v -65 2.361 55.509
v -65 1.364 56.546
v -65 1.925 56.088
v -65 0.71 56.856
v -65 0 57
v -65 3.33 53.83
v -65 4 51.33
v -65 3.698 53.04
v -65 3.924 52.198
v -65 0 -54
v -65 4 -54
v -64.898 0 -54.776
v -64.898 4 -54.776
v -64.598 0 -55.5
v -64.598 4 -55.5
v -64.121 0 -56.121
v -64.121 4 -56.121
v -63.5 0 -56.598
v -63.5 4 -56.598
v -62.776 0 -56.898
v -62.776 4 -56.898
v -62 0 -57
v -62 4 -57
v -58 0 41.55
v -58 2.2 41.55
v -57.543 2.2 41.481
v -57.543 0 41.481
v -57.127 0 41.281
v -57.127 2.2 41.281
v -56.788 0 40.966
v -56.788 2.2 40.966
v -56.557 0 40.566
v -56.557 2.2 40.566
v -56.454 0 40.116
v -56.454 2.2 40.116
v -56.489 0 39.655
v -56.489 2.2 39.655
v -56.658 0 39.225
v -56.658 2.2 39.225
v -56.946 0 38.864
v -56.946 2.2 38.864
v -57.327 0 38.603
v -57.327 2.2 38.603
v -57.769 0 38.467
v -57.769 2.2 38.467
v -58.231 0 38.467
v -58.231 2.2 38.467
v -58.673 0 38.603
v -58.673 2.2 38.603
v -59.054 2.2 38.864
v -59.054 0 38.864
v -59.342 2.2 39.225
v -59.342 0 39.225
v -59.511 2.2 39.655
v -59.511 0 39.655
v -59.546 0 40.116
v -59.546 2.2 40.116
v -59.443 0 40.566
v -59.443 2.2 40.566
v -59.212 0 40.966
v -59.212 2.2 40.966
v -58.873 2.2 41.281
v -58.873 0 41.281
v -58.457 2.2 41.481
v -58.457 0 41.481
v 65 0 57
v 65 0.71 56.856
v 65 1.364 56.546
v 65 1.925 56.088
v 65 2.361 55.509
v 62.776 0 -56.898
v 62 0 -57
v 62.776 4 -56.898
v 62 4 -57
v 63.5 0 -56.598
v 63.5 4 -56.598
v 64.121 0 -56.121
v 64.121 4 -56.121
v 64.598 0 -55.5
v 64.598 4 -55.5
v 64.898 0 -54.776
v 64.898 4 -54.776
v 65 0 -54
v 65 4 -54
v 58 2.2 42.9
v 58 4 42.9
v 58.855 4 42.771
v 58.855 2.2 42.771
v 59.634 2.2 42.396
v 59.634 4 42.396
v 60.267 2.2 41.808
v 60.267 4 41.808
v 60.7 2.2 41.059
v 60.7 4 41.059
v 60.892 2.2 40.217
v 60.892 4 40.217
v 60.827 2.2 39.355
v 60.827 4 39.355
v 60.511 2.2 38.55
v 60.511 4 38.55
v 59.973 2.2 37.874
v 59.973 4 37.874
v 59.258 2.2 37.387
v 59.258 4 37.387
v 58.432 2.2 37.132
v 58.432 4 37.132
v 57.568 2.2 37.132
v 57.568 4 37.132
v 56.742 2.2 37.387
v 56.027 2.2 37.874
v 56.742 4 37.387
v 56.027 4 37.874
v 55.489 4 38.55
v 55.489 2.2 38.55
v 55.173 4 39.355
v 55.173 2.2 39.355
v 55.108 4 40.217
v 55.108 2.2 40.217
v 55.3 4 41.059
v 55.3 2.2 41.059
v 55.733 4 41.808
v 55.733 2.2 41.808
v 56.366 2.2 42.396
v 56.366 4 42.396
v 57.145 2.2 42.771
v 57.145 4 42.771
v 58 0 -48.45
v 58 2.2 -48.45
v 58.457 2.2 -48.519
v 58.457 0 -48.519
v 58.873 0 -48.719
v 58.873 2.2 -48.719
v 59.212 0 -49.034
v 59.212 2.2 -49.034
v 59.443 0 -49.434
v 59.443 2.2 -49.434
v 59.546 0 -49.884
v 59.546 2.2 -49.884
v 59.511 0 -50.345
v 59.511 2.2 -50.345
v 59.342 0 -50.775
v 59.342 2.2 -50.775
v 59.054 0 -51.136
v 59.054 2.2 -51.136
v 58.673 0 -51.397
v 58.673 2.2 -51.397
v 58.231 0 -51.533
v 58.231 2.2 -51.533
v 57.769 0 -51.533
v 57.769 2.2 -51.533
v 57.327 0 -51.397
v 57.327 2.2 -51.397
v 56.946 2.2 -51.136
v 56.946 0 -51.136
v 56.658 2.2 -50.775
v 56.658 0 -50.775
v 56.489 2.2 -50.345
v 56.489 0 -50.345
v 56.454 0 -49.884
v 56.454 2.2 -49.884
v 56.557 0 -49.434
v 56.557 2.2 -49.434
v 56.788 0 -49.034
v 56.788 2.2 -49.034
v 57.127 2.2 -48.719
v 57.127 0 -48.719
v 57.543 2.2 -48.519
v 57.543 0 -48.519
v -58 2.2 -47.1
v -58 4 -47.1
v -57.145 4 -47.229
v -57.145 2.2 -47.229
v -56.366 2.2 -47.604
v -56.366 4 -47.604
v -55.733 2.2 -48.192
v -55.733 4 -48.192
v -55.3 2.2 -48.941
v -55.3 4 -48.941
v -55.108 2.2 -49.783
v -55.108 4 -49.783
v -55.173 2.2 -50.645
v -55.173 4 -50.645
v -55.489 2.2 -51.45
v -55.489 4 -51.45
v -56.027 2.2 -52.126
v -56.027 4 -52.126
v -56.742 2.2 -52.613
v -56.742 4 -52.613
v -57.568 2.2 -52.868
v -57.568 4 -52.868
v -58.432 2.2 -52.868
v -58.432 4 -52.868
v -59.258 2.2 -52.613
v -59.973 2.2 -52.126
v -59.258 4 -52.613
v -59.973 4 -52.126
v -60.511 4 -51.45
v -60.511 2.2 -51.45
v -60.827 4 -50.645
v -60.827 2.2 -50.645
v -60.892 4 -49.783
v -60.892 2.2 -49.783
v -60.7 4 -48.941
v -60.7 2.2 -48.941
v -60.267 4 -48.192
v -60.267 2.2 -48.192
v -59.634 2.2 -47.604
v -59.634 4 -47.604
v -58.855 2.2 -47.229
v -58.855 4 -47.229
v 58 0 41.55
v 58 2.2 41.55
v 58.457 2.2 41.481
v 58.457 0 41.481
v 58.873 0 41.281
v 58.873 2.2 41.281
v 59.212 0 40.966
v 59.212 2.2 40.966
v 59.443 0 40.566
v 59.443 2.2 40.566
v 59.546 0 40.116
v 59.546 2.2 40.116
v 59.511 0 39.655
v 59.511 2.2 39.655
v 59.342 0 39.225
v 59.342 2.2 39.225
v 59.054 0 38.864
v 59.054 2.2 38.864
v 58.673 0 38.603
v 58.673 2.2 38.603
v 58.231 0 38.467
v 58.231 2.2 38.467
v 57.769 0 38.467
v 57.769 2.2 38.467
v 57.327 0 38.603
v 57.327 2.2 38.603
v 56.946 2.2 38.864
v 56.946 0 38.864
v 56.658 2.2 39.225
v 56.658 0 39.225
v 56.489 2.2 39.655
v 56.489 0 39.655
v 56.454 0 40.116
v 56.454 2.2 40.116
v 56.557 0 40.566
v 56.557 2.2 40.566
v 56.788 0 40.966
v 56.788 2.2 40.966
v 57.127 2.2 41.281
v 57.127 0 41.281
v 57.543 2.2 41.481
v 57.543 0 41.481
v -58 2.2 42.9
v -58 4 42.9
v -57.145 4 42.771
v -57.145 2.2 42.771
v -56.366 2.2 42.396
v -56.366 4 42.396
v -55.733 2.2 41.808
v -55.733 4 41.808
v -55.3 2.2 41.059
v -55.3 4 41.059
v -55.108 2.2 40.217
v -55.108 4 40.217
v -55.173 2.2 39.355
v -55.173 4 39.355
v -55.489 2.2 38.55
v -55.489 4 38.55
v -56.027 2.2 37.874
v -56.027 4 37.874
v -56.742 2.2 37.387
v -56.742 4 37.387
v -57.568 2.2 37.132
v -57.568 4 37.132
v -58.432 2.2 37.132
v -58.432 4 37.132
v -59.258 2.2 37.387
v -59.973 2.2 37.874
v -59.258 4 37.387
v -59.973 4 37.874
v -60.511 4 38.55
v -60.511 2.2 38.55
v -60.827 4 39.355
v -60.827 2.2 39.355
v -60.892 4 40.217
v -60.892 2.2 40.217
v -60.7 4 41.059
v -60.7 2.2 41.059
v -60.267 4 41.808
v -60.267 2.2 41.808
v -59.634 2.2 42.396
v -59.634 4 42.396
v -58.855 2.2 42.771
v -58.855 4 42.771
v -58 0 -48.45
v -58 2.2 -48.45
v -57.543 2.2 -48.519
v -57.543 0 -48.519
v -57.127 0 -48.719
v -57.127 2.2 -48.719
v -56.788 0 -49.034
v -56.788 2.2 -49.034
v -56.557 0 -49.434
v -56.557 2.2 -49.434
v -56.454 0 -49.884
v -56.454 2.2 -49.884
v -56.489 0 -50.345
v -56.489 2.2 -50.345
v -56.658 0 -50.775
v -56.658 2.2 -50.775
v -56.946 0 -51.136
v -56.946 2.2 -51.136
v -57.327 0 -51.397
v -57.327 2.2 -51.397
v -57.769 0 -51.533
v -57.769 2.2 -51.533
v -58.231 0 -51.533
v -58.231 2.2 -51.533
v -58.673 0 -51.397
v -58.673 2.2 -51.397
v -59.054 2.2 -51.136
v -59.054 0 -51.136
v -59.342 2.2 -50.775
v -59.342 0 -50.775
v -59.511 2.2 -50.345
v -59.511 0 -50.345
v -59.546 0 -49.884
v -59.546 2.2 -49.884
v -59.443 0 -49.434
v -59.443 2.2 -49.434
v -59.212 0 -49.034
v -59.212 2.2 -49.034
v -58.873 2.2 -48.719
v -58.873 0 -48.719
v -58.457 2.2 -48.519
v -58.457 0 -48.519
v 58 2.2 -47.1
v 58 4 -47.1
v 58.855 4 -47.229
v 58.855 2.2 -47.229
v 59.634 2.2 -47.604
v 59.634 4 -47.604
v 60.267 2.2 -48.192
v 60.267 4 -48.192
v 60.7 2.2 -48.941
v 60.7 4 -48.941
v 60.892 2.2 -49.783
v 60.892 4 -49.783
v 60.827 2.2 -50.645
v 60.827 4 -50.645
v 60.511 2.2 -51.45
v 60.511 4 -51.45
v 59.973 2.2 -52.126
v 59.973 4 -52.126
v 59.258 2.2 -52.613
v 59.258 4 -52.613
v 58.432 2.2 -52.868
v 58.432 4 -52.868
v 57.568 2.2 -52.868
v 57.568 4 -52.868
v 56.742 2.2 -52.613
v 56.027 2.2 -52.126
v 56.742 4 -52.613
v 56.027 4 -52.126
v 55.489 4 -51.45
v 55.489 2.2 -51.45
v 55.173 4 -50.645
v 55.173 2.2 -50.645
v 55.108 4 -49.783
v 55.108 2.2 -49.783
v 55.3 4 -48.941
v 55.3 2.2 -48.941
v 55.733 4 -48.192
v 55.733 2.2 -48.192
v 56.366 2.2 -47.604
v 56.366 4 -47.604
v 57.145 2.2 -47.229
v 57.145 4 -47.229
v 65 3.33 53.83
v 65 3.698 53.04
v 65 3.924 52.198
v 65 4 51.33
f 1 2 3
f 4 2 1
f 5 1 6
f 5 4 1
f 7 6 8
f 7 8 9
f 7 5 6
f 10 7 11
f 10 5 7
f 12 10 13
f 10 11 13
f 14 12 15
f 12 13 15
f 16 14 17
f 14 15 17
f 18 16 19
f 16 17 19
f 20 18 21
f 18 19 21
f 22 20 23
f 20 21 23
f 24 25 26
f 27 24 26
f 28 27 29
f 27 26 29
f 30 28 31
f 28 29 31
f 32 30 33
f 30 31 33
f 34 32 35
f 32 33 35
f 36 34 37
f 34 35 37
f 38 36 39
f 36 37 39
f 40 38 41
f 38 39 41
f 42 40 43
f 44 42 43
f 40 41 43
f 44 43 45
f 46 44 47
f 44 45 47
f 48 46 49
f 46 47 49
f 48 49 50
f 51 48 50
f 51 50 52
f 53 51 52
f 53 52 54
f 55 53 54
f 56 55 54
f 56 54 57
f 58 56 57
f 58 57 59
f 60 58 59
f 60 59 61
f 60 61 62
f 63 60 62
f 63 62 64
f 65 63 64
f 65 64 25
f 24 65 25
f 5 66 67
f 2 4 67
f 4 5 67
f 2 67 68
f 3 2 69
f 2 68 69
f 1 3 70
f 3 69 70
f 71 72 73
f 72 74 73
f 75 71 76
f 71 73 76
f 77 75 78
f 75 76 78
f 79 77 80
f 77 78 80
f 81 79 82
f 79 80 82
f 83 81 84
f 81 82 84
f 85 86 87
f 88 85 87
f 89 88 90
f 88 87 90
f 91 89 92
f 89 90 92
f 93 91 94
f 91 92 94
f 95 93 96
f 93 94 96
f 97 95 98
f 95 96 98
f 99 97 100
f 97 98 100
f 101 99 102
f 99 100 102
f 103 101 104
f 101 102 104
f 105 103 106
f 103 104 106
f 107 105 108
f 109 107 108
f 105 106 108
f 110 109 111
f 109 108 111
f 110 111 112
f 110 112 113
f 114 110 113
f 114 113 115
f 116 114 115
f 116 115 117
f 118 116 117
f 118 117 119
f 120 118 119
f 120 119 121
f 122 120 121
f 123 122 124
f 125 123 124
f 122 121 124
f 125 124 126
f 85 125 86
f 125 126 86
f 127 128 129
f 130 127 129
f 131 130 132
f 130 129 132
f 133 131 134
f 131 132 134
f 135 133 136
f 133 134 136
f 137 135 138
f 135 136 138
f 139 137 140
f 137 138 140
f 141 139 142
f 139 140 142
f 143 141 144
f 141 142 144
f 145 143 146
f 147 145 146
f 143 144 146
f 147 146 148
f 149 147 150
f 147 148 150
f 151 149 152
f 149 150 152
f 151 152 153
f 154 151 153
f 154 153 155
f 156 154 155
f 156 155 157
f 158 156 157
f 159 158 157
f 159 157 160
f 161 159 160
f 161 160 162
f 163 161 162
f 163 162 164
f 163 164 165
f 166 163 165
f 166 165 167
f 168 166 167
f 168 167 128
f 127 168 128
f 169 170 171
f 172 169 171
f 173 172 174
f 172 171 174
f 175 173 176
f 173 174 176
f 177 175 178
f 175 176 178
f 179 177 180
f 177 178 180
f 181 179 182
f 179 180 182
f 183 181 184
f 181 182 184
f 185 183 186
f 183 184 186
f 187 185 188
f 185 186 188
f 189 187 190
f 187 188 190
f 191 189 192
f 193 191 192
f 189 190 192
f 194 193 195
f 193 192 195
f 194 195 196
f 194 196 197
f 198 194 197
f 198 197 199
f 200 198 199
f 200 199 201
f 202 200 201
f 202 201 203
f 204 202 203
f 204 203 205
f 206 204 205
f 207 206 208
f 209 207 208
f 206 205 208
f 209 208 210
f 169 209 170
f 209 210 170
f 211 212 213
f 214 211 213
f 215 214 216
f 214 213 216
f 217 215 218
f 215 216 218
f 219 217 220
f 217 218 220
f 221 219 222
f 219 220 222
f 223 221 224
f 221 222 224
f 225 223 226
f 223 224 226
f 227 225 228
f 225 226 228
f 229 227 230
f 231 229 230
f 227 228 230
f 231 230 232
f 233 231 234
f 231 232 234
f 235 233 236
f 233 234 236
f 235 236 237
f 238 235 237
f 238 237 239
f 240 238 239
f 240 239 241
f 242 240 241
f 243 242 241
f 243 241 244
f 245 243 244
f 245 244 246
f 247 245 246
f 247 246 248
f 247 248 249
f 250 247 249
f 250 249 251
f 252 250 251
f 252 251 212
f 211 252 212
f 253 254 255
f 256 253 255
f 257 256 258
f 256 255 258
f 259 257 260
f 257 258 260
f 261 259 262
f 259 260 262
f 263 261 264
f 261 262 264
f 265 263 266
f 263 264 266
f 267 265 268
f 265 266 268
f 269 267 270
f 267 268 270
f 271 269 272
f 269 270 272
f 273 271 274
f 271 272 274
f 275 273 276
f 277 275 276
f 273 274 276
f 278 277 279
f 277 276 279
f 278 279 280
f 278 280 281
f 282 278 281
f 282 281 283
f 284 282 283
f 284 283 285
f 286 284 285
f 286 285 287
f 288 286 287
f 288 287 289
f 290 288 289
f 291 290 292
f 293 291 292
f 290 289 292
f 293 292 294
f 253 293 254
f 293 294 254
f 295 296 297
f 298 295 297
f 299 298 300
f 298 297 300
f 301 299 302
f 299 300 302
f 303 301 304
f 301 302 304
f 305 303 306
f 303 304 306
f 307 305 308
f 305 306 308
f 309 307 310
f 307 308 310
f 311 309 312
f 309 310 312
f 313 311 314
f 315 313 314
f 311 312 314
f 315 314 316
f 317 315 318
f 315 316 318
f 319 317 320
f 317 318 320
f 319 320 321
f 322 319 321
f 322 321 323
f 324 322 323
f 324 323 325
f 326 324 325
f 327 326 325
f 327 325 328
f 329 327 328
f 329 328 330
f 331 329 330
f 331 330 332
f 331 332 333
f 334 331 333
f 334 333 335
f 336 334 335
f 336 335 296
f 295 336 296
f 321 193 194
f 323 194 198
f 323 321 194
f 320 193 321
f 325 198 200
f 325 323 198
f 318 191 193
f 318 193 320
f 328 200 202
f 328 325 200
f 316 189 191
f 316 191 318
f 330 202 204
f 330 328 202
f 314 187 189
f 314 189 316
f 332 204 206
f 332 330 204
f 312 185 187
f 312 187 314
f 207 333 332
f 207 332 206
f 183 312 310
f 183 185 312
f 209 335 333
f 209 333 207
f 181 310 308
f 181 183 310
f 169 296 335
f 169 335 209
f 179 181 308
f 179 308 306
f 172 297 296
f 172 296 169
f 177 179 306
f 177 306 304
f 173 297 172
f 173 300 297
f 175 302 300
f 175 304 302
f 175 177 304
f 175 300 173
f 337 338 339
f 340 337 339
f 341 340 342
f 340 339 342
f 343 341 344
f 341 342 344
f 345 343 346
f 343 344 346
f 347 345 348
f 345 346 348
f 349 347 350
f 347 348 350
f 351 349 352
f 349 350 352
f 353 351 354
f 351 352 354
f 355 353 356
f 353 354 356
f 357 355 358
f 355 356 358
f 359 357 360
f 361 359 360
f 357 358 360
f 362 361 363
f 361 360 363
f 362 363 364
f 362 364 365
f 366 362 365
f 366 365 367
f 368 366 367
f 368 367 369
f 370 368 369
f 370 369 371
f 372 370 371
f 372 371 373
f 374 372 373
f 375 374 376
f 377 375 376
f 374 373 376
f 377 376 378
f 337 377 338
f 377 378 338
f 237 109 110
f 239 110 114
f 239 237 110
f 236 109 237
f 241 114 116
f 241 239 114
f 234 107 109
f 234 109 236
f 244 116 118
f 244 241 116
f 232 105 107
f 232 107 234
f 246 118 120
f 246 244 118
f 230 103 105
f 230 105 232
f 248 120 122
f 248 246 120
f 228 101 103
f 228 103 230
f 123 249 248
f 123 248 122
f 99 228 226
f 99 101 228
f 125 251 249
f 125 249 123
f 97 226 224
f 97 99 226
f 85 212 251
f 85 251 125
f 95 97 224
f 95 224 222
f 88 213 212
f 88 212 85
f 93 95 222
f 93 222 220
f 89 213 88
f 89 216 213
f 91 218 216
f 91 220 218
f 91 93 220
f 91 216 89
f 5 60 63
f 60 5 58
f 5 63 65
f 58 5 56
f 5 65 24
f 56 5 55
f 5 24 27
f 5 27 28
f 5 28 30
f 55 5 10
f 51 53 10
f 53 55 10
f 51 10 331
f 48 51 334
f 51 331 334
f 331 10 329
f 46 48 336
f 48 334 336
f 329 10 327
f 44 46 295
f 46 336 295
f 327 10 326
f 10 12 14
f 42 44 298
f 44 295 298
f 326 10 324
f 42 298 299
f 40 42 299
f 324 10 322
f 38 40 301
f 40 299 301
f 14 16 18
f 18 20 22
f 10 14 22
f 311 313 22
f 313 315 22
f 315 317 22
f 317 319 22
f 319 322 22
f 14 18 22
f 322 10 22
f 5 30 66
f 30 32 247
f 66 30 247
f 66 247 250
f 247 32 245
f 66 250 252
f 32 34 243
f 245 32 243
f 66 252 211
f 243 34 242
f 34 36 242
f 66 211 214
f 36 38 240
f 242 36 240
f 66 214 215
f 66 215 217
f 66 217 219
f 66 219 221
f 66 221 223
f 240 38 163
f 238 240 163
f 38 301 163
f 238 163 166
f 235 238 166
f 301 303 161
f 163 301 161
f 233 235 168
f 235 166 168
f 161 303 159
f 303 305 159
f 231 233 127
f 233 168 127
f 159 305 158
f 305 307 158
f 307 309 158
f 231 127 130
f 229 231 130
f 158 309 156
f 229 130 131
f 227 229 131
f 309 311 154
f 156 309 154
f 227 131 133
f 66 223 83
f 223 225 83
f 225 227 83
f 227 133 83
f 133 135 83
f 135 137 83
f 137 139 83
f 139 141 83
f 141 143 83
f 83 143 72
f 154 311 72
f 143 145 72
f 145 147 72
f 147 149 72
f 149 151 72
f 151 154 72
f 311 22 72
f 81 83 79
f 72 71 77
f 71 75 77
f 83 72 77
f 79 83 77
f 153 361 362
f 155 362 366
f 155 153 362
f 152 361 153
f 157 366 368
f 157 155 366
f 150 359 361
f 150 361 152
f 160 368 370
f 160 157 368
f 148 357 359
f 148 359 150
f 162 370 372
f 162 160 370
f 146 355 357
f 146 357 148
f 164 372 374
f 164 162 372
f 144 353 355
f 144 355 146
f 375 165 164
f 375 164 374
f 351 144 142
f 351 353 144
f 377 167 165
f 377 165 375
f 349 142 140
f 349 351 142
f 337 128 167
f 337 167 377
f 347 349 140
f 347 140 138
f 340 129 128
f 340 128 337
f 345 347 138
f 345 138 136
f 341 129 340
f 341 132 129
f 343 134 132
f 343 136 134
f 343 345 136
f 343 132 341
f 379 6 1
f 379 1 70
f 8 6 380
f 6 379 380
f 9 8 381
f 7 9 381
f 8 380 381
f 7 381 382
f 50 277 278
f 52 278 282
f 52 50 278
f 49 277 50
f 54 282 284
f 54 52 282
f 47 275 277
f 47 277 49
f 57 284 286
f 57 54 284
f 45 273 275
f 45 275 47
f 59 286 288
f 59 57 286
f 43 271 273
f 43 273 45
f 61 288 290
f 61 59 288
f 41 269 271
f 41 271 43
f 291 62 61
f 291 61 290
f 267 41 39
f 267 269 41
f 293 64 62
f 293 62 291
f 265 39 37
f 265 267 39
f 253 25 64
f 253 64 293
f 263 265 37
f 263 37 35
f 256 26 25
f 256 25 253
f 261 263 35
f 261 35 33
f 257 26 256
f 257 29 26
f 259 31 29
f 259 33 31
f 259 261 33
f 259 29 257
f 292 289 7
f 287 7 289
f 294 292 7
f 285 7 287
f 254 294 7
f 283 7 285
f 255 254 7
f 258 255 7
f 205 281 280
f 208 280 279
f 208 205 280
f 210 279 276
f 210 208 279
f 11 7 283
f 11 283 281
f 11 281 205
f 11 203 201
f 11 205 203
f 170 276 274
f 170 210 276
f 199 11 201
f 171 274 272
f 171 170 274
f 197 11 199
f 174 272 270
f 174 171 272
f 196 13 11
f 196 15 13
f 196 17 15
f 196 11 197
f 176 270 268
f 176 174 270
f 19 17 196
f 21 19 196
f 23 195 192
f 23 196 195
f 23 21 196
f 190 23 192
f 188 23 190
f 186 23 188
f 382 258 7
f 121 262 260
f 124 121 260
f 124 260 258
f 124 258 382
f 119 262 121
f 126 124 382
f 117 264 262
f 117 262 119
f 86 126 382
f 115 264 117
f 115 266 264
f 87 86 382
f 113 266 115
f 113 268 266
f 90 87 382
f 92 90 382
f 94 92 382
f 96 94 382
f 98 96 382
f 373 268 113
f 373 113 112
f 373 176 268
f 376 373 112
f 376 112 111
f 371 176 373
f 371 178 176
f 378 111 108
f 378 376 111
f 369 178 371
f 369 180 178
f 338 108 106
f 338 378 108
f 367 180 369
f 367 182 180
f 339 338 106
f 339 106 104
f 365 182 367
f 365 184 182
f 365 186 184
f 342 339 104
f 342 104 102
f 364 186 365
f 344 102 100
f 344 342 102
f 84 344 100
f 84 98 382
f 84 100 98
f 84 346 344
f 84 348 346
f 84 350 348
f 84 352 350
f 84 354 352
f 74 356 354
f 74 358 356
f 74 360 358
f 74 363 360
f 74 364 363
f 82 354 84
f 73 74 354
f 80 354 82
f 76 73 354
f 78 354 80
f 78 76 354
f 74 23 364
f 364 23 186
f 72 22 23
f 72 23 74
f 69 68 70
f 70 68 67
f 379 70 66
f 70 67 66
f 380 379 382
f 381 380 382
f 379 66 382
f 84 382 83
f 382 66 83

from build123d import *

# Parameters (mm, degrees)
SKETCH_1_W                  = 130
SKETCH_1_H                  = 114
EXTRUDE_1_DEPTH             = 4
CHAMFER_1_SIZE              = 2.5
CHAMFER_1_SIZE2             = 4.330127019
FILLET_1_R                  = 5
FILLET_2_R                  = 3
FILLET_3_R                  = 3
SKETCH_2_R                  = 1.55
CUT_EXTRUDE_1_DEPTH         = 87.544786094
PATTERN_LINEAR_1_COUNT      = 2
PATTERN_LINEAR_1_PITCH      = 116
PATTERN_LINEAR_1_COUNT_DIR2 = 2
PATTERN_LINEAR_1_PITCH_DIR2 = 90
SKETCH_4_R                  = 2.9
CUT_EXTRUDE_2_DEPTH         = 1.8
PATTERN_LINEAR_2_COUNT      = 2
PATTERN_LINEAR_2_PITCH      = 116
PATTERN_LINEAR_2_COUNT_DIR2 = 2
PATTERN_LINEAR_2_PITCH_DIR2 = 90


with BuildPart() as part:
    # Эскиз1 → Бобышка-Вытянуть1 (new body)
    with BuildSketch(Plane(origin=(0, 0, 0), x_dir=(1, 0, 0), z_dir=(0, 1, 0))):
        Rectangle(SKETCH_1_W, SKETCH_1_H)
    extrude(amount=EXTRUDE_1_DEPTH)

    # Фаска1
    chamfer_1_edges = [part.edges().sort_by_distance(p)[0] for p in [
        (0, 4, 57),
    ]]
    chamfer_1_side = [part.faces().sort_by_distance(p)[0] for p in [
        (0, 2, 57),
    ]]
    chamfer(chamfer_1_edges, length=CHAMFER_1_SIZE, length2=CHAMFER_1_SIZE2, reference=chamfer_1_side[0])

    # Скругление1
    fillet_1_edges = [part.edges().sort_by_distance(p)[0] for p in [
        (0, 4, 52.669872981),
    ]]
    fillet(fillet_1_edges, radius=FILLET_1_R)

    # Скругление2
    # the kernel refuses this fillet: 3 mm, written as the material it takes off along each edge
    with BuildSketch(Plane(origin=(69.302949009, 1.5, 57), x_dir=(0, 0.4999999999999978, -0.8660254037844398), z_dir=(-1, 0, 0))) as fillet_2_piece_1:
        with BuildLine():
            CenterArc((1.721179604, 3), FILLET_2_R, 214.540406951, 55.459593049)
            Line((-0.75, 1.299038106), (-0.799423592, 1.265018868))
            ThreePointArc((-0.799423592, 1.265018868), (-0.426961524, 0.619519053), (-0.051961524, -0.03))
            Line((-0.051961524, -0.03), (0, -0.06))
            Line((0, -0.06), (1.721179604, -0.06))
            Line((1.721179604, -0.06), (1.721179604, 0))
        make_face()
    extrude(amount=138.605898019, mode=Mode.SUBTRACT)

    # Скругление3
    fillet_3_edges = [part.edges().sort_by_distance(p)[0] for p in [
        (-65, 2, -57),
        (65, 2, -57),
    ]]
    fillet(fillet_3_edges, radius=FILLET_3_R)

    # Эскиз2 → Вырез-Вытянуть1 (cut, through all)
    with BuildSketch(Plane(origin=(0, 4, 0), x_dir=(1, 0, 0), z_dir=(0, 1, 0))):
        with Locations(Location((-58, 50, 0), (0, 0, 270))):
            Circle(SKETCH_2_R)
    cut_extrude_1 = extrude(amount=-CUT_EXTRUDE_1_DEPTH, mode=Mode.SUBTRACT)

    # Линейный массив1: Cut-Extrude 1 2 × 2
    with Locations(*[(i * PATTERN_LINEAR_1_PITCH, 0, j * PATTERN_LINEAR_1_PITCH_DIR2) for i in range(PATTERN_LINEAR_1_COUNT) for j in range(PATTERN_LINEAR_1_COUNT_DIR2) if (i, j) != (0, 0)]):
        add(cut_extrude_1, mode=Mode.SUBTRACT)

    # Эскиз4 → Вырез-Вытянуть2 (cut)
    with BuildSketch(Plane(origin=(0, 4, 0), x_dir=(1, 0, 0), z_dir=(0, 1, 0))):
        with Locations(Location((-58, 50, 0), (0, 0, 270))):
            Circle(SKETCH_4_R)
    cut_extrude_2 = extrude(amount=-CUT_EXTRUDE_2_DEPTH, mode=Mode.SUBTRACT)

    # Линейный массив2: Cut-Extrude 2 2 × 2
    with Locations(*[(i * PATTERN_LINEAR_2_PITCH, 0, j * PATTERN_LINEAR_2_PITCH_DIR2) for i in range(PATTERN_LINEAR_2_COUNT) for j in range(PATTERN_LINEAR_2_COUNT_DIR2) if (i, j) != (0, 0)]):
        add(cut_extrude_2, mode=Mode.SUBTRACT)


solid = part.part
